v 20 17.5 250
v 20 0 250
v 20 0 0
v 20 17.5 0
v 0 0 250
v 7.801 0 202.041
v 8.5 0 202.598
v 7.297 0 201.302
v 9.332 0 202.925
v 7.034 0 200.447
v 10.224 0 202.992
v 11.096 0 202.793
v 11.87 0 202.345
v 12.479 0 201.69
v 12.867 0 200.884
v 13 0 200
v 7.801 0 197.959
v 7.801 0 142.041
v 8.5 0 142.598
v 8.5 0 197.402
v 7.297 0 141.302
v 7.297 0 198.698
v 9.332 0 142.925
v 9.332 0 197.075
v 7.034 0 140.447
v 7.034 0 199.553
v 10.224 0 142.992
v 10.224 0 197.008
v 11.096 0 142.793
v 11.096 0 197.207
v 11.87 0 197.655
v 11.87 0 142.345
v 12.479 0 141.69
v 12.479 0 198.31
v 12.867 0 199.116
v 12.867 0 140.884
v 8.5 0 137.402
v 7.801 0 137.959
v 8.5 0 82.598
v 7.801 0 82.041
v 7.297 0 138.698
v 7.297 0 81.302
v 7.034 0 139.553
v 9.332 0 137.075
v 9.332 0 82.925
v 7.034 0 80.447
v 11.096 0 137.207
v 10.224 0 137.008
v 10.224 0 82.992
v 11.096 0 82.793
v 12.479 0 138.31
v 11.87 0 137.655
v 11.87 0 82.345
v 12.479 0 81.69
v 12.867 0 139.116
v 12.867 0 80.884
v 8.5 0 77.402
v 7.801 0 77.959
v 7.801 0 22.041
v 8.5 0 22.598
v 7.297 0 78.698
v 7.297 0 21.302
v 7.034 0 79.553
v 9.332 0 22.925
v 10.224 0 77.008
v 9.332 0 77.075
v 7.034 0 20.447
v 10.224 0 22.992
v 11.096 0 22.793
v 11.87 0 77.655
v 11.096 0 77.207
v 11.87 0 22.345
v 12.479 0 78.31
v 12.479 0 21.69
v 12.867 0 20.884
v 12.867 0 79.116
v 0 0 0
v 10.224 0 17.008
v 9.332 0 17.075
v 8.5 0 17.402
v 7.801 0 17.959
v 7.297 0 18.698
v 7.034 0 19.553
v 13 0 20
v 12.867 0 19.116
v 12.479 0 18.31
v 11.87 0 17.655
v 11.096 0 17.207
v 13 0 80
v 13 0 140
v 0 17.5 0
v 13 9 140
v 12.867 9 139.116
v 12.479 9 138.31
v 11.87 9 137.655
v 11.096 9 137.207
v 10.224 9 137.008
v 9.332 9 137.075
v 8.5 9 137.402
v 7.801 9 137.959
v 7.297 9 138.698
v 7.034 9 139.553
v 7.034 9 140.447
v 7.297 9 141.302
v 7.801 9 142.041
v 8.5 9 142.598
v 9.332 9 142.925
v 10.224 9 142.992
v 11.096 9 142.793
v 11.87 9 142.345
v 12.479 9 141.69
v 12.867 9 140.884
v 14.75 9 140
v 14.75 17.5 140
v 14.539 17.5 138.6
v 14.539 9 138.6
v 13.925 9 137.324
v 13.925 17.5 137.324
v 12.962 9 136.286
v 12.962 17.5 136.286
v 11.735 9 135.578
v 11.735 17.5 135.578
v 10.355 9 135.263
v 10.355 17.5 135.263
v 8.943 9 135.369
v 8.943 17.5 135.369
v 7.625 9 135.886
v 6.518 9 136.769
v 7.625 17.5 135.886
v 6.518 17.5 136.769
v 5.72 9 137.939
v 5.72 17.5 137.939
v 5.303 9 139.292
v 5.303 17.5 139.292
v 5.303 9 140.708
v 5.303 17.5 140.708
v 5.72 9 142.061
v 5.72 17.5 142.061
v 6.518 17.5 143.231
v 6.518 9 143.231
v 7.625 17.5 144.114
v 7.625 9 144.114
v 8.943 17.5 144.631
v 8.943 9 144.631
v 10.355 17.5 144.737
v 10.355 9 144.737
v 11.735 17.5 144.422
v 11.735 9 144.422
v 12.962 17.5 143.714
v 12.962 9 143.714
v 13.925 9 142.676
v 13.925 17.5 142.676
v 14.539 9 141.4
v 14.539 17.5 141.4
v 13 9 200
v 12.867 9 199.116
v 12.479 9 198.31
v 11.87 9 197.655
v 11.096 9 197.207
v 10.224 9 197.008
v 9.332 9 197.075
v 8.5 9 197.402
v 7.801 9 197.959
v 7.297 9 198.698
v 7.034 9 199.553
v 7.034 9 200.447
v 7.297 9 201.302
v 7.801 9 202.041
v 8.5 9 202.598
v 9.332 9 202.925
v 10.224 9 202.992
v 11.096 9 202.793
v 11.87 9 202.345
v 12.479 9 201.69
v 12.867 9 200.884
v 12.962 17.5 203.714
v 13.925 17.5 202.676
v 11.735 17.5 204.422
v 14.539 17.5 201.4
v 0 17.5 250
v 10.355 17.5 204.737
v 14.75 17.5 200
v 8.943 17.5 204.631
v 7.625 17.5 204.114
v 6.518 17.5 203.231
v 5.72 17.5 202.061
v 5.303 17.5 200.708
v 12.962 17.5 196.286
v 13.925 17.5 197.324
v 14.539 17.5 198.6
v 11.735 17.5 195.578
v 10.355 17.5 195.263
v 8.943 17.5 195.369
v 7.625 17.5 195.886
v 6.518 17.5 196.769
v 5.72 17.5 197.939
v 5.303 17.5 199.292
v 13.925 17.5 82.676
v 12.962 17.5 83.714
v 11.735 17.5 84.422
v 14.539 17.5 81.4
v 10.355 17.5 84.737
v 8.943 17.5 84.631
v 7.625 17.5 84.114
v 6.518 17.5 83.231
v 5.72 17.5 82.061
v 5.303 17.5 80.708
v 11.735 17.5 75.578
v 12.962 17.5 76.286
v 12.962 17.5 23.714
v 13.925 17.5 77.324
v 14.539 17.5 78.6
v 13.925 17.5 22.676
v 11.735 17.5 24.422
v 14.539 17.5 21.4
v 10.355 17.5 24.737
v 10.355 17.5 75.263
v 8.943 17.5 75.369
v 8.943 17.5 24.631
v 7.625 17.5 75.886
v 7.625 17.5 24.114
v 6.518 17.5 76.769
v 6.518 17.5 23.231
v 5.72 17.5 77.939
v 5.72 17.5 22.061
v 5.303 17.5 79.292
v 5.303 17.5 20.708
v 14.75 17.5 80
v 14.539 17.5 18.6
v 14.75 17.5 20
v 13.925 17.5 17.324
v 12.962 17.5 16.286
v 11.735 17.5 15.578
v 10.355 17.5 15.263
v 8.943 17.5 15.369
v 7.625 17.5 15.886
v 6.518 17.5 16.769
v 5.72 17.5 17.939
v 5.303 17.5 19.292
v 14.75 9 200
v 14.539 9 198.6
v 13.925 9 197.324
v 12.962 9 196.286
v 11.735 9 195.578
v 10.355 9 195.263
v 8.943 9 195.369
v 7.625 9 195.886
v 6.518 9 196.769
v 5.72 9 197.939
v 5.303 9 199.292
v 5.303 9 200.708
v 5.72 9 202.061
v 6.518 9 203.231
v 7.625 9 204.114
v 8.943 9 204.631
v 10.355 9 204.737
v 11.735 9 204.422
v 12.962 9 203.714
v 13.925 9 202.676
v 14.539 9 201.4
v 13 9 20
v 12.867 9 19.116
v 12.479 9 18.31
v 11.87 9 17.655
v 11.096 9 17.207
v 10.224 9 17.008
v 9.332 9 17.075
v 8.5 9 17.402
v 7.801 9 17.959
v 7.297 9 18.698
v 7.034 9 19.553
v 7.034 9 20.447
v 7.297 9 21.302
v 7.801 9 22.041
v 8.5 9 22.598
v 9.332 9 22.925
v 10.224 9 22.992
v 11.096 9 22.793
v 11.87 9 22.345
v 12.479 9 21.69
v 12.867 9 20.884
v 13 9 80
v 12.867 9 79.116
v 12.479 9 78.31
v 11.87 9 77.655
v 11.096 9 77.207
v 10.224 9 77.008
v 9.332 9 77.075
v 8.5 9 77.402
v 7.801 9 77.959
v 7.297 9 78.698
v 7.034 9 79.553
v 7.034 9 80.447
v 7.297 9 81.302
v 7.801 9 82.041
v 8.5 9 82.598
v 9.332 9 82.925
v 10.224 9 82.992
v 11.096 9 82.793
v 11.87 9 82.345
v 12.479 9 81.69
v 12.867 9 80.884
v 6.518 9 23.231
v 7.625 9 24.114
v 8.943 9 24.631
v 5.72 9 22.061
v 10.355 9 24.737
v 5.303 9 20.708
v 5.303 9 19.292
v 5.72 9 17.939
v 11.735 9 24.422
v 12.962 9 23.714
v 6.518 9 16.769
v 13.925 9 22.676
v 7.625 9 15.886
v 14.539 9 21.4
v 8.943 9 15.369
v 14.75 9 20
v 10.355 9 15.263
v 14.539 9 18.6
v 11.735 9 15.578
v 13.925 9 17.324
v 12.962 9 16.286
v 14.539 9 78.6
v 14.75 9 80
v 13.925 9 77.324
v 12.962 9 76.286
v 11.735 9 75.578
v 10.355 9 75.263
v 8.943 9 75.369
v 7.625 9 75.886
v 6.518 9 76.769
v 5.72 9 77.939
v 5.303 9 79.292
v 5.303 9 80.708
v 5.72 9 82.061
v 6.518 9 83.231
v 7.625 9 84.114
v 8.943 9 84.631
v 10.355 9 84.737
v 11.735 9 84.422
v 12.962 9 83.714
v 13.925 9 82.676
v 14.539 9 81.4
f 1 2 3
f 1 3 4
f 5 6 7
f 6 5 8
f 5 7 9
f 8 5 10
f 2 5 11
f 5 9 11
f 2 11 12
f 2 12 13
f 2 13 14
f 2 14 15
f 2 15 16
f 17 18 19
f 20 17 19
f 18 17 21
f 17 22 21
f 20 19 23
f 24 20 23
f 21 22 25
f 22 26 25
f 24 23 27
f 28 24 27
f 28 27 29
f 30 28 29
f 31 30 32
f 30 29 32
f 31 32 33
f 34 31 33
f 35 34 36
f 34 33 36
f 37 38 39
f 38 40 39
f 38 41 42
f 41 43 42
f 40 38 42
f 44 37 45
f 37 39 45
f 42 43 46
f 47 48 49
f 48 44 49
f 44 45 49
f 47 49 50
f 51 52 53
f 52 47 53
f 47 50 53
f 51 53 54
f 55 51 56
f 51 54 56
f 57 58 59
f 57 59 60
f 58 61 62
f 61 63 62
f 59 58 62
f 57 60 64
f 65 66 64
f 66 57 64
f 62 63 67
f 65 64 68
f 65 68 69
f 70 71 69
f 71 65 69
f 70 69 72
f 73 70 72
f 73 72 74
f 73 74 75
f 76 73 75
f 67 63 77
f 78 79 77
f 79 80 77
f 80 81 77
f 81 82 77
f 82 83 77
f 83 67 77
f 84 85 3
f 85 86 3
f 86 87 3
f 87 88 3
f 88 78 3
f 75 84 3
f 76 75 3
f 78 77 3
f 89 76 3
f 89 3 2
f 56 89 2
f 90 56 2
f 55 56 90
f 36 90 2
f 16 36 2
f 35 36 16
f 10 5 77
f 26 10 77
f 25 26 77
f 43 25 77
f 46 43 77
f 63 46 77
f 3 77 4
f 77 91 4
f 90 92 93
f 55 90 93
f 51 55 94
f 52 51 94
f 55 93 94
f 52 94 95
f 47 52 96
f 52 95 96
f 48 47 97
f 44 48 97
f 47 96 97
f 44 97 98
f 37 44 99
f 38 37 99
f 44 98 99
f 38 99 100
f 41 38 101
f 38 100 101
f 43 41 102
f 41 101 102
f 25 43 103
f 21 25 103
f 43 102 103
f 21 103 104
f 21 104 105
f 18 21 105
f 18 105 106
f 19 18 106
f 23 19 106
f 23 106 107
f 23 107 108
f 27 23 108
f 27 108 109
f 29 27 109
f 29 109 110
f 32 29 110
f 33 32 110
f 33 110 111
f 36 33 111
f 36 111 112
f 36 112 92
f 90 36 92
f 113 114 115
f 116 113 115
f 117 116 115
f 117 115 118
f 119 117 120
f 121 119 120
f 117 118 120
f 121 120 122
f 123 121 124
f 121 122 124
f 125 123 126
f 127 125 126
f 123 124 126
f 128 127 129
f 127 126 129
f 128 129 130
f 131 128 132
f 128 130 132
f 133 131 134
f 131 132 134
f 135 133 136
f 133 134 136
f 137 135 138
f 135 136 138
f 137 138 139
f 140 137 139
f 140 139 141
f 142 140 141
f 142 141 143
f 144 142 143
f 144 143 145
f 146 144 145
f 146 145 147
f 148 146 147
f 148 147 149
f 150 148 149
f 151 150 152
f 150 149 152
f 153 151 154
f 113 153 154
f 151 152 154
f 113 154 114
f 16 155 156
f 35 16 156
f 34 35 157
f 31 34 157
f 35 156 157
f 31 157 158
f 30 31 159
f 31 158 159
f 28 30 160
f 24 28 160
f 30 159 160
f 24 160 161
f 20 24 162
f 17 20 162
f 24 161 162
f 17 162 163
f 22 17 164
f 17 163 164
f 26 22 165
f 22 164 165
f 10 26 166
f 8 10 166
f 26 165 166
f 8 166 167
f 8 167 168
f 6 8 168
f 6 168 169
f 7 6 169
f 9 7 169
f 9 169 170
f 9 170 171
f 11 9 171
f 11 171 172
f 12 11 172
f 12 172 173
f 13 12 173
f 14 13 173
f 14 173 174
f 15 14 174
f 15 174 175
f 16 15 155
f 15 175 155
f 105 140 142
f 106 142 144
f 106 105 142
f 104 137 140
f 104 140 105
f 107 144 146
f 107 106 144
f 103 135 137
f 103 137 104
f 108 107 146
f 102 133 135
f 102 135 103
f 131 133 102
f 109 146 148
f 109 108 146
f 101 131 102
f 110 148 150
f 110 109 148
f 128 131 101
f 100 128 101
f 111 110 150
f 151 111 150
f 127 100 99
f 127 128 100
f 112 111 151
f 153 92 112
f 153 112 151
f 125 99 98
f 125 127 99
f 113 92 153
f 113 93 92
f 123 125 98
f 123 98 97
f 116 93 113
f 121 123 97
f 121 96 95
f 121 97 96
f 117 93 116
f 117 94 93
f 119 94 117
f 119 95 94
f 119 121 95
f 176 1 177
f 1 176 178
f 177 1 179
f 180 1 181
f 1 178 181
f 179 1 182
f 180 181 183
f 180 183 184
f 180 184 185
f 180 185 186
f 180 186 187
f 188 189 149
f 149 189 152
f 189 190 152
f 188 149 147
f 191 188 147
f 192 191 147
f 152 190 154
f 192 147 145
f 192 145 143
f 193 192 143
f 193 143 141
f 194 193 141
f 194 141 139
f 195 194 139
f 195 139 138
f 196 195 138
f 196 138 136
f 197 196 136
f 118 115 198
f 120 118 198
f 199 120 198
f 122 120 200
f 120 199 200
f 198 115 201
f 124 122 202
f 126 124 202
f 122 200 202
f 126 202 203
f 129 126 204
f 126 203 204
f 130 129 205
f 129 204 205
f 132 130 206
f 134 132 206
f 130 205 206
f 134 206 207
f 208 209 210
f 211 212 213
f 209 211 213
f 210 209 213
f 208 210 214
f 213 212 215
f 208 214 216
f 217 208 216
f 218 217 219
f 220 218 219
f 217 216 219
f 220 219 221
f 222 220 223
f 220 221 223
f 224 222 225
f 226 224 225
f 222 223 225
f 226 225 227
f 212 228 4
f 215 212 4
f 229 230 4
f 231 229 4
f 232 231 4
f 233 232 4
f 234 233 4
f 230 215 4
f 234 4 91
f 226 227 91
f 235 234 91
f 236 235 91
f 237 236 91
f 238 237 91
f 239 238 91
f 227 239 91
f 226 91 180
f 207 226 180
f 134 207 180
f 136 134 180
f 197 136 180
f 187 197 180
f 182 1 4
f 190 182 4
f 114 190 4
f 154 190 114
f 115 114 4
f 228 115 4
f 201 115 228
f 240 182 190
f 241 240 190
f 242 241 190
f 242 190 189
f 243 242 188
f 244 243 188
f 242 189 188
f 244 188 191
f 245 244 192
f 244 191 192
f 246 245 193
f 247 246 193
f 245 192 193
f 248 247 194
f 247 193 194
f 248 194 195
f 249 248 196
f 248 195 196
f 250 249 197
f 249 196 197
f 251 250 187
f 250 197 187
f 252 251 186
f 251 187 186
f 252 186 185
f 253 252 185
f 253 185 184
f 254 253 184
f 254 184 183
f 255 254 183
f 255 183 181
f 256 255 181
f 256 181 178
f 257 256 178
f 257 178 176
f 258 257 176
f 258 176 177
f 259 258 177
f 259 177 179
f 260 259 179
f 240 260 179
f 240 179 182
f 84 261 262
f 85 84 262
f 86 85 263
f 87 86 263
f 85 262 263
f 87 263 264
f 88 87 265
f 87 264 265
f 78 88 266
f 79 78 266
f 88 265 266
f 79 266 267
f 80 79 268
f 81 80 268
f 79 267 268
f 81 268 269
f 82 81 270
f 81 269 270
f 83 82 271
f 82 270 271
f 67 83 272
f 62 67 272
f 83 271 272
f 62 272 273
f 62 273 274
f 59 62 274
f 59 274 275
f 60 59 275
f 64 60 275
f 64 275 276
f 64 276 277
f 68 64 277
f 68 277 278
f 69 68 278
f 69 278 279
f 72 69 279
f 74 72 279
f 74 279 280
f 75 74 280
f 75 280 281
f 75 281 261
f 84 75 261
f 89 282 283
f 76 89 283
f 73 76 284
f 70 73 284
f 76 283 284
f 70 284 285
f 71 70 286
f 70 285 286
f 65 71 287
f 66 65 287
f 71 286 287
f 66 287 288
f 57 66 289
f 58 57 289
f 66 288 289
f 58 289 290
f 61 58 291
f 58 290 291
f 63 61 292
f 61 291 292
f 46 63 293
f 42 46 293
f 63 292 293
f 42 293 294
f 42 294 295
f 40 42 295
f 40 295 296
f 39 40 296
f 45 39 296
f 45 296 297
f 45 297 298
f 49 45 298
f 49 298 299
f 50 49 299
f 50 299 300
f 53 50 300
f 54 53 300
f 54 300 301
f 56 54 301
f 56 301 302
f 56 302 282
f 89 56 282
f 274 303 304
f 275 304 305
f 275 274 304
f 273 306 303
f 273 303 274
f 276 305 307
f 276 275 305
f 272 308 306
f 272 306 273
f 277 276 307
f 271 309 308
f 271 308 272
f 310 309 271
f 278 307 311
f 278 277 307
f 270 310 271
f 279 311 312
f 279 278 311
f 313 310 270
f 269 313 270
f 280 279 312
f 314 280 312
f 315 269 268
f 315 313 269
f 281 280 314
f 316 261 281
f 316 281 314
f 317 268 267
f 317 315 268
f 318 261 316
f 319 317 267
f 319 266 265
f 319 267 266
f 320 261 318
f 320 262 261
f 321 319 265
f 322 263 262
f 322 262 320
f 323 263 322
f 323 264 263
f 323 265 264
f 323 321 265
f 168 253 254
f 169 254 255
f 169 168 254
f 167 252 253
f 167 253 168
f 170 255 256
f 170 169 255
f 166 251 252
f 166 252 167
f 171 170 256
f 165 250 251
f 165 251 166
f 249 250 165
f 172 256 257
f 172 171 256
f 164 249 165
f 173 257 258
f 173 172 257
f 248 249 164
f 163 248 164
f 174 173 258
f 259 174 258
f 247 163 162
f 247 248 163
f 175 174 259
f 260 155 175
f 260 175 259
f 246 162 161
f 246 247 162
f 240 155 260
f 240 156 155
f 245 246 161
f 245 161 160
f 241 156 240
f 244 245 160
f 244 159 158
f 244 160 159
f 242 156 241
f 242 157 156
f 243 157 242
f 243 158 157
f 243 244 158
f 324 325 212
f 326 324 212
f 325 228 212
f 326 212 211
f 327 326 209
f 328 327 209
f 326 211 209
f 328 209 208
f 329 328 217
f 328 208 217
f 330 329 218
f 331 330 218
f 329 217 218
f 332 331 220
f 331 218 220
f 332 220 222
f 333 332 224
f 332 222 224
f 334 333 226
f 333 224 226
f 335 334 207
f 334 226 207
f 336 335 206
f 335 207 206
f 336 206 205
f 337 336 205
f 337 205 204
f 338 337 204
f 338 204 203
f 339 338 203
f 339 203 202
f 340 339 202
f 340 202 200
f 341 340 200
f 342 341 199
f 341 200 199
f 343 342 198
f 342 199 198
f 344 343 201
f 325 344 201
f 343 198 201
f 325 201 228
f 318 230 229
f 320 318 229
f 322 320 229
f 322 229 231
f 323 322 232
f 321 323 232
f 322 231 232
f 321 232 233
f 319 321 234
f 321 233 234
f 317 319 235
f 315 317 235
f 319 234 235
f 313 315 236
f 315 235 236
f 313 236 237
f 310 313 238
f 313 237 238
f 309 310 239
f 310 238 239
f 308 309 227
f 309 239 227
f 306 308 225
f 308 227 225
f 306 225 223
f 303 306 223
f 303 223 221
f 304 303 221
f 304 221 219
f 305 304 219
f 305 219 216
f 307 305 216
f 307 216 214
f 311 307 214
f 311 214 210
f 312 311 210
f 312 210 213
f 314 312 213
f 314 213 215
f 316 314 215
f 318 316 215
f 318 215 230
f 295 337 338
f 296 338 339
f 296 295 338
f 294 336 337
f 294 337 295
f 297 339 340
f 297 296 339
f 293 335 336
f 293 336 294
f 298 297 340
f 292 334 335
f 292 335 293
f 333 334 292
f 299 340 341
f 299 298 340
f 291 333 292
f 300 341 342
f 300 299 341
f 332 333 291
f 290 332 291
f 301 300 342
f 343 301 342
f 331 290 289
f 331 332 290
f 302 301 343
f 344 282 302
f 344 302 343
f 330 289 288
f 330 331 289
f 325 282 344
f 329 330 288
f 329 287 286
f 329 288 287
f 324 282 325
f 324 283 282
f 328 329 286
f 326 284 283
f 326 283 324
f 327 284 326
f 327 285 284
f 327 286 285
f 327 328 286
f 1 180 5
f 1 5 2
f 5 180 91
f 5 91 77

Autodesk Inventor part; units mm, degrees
ref_plane "YZ Plane" through (0, 0, 0) normal (1, 0, 0) x (0, 1, 0)
ref_plane "XZ Plane" through (0, 0, 0) normal (0, 1, 0) x (-1, 0, 0)
ref_plane "XY Plane" through (0, 0, 0) normal (0, 0, 1) x (1, 0, 0)
sketch "Sketch1" plane through (0, 0, 0) normal (0, 0, 1) x (1, 0, 0)
  line L0 (0, 0) -> (20, 0)
  line L1 (20, 0) -> (20, 17.5)
  line L2 (20, 17.5) -> (0, 17.5)
  line L3 (0, 17.5) -> (0, 0)
  dimension "d0" = 20
  dimension "d1" = 17.5
extrude "Extrusion1" add sketch "Sketch1" along normal blind 250
sketch "Sketch2" plane through (0, 17.5, 0) normal (0, 1, 0) x (1, 0, 0)
  circle A0 centre (10, -20) radius 3
  line L0 (20, 0) -> (0, 0) projected
  point P0 (10, 0)
  dimension "d4" = 6
  dimension "d5" = 20
extrude "Extrusion2" cut sketch "Sketch2" against normal up to surface (17.5 mm away)
sketch "Sketch3" plane through (0, 17.5, 0) normal (0, 1, 0) x (1, 0, 0)
  circle A0 centre (10, -20) radius 4.75
  circle A1 centre (10, -20) radius 3 construction
  point P0 (0, 0)
  dimension "d8" = 9.5
extrude "Extrusion3" cut sketch "Sketch3" against normal blind 8.5
pattern_linear "Rectangular Pattern1" count 18 spacing 60 along (0, 0, 1) of "Extrusion2", "Extrusion3"
properties part number "HGW20CC_Rack"
